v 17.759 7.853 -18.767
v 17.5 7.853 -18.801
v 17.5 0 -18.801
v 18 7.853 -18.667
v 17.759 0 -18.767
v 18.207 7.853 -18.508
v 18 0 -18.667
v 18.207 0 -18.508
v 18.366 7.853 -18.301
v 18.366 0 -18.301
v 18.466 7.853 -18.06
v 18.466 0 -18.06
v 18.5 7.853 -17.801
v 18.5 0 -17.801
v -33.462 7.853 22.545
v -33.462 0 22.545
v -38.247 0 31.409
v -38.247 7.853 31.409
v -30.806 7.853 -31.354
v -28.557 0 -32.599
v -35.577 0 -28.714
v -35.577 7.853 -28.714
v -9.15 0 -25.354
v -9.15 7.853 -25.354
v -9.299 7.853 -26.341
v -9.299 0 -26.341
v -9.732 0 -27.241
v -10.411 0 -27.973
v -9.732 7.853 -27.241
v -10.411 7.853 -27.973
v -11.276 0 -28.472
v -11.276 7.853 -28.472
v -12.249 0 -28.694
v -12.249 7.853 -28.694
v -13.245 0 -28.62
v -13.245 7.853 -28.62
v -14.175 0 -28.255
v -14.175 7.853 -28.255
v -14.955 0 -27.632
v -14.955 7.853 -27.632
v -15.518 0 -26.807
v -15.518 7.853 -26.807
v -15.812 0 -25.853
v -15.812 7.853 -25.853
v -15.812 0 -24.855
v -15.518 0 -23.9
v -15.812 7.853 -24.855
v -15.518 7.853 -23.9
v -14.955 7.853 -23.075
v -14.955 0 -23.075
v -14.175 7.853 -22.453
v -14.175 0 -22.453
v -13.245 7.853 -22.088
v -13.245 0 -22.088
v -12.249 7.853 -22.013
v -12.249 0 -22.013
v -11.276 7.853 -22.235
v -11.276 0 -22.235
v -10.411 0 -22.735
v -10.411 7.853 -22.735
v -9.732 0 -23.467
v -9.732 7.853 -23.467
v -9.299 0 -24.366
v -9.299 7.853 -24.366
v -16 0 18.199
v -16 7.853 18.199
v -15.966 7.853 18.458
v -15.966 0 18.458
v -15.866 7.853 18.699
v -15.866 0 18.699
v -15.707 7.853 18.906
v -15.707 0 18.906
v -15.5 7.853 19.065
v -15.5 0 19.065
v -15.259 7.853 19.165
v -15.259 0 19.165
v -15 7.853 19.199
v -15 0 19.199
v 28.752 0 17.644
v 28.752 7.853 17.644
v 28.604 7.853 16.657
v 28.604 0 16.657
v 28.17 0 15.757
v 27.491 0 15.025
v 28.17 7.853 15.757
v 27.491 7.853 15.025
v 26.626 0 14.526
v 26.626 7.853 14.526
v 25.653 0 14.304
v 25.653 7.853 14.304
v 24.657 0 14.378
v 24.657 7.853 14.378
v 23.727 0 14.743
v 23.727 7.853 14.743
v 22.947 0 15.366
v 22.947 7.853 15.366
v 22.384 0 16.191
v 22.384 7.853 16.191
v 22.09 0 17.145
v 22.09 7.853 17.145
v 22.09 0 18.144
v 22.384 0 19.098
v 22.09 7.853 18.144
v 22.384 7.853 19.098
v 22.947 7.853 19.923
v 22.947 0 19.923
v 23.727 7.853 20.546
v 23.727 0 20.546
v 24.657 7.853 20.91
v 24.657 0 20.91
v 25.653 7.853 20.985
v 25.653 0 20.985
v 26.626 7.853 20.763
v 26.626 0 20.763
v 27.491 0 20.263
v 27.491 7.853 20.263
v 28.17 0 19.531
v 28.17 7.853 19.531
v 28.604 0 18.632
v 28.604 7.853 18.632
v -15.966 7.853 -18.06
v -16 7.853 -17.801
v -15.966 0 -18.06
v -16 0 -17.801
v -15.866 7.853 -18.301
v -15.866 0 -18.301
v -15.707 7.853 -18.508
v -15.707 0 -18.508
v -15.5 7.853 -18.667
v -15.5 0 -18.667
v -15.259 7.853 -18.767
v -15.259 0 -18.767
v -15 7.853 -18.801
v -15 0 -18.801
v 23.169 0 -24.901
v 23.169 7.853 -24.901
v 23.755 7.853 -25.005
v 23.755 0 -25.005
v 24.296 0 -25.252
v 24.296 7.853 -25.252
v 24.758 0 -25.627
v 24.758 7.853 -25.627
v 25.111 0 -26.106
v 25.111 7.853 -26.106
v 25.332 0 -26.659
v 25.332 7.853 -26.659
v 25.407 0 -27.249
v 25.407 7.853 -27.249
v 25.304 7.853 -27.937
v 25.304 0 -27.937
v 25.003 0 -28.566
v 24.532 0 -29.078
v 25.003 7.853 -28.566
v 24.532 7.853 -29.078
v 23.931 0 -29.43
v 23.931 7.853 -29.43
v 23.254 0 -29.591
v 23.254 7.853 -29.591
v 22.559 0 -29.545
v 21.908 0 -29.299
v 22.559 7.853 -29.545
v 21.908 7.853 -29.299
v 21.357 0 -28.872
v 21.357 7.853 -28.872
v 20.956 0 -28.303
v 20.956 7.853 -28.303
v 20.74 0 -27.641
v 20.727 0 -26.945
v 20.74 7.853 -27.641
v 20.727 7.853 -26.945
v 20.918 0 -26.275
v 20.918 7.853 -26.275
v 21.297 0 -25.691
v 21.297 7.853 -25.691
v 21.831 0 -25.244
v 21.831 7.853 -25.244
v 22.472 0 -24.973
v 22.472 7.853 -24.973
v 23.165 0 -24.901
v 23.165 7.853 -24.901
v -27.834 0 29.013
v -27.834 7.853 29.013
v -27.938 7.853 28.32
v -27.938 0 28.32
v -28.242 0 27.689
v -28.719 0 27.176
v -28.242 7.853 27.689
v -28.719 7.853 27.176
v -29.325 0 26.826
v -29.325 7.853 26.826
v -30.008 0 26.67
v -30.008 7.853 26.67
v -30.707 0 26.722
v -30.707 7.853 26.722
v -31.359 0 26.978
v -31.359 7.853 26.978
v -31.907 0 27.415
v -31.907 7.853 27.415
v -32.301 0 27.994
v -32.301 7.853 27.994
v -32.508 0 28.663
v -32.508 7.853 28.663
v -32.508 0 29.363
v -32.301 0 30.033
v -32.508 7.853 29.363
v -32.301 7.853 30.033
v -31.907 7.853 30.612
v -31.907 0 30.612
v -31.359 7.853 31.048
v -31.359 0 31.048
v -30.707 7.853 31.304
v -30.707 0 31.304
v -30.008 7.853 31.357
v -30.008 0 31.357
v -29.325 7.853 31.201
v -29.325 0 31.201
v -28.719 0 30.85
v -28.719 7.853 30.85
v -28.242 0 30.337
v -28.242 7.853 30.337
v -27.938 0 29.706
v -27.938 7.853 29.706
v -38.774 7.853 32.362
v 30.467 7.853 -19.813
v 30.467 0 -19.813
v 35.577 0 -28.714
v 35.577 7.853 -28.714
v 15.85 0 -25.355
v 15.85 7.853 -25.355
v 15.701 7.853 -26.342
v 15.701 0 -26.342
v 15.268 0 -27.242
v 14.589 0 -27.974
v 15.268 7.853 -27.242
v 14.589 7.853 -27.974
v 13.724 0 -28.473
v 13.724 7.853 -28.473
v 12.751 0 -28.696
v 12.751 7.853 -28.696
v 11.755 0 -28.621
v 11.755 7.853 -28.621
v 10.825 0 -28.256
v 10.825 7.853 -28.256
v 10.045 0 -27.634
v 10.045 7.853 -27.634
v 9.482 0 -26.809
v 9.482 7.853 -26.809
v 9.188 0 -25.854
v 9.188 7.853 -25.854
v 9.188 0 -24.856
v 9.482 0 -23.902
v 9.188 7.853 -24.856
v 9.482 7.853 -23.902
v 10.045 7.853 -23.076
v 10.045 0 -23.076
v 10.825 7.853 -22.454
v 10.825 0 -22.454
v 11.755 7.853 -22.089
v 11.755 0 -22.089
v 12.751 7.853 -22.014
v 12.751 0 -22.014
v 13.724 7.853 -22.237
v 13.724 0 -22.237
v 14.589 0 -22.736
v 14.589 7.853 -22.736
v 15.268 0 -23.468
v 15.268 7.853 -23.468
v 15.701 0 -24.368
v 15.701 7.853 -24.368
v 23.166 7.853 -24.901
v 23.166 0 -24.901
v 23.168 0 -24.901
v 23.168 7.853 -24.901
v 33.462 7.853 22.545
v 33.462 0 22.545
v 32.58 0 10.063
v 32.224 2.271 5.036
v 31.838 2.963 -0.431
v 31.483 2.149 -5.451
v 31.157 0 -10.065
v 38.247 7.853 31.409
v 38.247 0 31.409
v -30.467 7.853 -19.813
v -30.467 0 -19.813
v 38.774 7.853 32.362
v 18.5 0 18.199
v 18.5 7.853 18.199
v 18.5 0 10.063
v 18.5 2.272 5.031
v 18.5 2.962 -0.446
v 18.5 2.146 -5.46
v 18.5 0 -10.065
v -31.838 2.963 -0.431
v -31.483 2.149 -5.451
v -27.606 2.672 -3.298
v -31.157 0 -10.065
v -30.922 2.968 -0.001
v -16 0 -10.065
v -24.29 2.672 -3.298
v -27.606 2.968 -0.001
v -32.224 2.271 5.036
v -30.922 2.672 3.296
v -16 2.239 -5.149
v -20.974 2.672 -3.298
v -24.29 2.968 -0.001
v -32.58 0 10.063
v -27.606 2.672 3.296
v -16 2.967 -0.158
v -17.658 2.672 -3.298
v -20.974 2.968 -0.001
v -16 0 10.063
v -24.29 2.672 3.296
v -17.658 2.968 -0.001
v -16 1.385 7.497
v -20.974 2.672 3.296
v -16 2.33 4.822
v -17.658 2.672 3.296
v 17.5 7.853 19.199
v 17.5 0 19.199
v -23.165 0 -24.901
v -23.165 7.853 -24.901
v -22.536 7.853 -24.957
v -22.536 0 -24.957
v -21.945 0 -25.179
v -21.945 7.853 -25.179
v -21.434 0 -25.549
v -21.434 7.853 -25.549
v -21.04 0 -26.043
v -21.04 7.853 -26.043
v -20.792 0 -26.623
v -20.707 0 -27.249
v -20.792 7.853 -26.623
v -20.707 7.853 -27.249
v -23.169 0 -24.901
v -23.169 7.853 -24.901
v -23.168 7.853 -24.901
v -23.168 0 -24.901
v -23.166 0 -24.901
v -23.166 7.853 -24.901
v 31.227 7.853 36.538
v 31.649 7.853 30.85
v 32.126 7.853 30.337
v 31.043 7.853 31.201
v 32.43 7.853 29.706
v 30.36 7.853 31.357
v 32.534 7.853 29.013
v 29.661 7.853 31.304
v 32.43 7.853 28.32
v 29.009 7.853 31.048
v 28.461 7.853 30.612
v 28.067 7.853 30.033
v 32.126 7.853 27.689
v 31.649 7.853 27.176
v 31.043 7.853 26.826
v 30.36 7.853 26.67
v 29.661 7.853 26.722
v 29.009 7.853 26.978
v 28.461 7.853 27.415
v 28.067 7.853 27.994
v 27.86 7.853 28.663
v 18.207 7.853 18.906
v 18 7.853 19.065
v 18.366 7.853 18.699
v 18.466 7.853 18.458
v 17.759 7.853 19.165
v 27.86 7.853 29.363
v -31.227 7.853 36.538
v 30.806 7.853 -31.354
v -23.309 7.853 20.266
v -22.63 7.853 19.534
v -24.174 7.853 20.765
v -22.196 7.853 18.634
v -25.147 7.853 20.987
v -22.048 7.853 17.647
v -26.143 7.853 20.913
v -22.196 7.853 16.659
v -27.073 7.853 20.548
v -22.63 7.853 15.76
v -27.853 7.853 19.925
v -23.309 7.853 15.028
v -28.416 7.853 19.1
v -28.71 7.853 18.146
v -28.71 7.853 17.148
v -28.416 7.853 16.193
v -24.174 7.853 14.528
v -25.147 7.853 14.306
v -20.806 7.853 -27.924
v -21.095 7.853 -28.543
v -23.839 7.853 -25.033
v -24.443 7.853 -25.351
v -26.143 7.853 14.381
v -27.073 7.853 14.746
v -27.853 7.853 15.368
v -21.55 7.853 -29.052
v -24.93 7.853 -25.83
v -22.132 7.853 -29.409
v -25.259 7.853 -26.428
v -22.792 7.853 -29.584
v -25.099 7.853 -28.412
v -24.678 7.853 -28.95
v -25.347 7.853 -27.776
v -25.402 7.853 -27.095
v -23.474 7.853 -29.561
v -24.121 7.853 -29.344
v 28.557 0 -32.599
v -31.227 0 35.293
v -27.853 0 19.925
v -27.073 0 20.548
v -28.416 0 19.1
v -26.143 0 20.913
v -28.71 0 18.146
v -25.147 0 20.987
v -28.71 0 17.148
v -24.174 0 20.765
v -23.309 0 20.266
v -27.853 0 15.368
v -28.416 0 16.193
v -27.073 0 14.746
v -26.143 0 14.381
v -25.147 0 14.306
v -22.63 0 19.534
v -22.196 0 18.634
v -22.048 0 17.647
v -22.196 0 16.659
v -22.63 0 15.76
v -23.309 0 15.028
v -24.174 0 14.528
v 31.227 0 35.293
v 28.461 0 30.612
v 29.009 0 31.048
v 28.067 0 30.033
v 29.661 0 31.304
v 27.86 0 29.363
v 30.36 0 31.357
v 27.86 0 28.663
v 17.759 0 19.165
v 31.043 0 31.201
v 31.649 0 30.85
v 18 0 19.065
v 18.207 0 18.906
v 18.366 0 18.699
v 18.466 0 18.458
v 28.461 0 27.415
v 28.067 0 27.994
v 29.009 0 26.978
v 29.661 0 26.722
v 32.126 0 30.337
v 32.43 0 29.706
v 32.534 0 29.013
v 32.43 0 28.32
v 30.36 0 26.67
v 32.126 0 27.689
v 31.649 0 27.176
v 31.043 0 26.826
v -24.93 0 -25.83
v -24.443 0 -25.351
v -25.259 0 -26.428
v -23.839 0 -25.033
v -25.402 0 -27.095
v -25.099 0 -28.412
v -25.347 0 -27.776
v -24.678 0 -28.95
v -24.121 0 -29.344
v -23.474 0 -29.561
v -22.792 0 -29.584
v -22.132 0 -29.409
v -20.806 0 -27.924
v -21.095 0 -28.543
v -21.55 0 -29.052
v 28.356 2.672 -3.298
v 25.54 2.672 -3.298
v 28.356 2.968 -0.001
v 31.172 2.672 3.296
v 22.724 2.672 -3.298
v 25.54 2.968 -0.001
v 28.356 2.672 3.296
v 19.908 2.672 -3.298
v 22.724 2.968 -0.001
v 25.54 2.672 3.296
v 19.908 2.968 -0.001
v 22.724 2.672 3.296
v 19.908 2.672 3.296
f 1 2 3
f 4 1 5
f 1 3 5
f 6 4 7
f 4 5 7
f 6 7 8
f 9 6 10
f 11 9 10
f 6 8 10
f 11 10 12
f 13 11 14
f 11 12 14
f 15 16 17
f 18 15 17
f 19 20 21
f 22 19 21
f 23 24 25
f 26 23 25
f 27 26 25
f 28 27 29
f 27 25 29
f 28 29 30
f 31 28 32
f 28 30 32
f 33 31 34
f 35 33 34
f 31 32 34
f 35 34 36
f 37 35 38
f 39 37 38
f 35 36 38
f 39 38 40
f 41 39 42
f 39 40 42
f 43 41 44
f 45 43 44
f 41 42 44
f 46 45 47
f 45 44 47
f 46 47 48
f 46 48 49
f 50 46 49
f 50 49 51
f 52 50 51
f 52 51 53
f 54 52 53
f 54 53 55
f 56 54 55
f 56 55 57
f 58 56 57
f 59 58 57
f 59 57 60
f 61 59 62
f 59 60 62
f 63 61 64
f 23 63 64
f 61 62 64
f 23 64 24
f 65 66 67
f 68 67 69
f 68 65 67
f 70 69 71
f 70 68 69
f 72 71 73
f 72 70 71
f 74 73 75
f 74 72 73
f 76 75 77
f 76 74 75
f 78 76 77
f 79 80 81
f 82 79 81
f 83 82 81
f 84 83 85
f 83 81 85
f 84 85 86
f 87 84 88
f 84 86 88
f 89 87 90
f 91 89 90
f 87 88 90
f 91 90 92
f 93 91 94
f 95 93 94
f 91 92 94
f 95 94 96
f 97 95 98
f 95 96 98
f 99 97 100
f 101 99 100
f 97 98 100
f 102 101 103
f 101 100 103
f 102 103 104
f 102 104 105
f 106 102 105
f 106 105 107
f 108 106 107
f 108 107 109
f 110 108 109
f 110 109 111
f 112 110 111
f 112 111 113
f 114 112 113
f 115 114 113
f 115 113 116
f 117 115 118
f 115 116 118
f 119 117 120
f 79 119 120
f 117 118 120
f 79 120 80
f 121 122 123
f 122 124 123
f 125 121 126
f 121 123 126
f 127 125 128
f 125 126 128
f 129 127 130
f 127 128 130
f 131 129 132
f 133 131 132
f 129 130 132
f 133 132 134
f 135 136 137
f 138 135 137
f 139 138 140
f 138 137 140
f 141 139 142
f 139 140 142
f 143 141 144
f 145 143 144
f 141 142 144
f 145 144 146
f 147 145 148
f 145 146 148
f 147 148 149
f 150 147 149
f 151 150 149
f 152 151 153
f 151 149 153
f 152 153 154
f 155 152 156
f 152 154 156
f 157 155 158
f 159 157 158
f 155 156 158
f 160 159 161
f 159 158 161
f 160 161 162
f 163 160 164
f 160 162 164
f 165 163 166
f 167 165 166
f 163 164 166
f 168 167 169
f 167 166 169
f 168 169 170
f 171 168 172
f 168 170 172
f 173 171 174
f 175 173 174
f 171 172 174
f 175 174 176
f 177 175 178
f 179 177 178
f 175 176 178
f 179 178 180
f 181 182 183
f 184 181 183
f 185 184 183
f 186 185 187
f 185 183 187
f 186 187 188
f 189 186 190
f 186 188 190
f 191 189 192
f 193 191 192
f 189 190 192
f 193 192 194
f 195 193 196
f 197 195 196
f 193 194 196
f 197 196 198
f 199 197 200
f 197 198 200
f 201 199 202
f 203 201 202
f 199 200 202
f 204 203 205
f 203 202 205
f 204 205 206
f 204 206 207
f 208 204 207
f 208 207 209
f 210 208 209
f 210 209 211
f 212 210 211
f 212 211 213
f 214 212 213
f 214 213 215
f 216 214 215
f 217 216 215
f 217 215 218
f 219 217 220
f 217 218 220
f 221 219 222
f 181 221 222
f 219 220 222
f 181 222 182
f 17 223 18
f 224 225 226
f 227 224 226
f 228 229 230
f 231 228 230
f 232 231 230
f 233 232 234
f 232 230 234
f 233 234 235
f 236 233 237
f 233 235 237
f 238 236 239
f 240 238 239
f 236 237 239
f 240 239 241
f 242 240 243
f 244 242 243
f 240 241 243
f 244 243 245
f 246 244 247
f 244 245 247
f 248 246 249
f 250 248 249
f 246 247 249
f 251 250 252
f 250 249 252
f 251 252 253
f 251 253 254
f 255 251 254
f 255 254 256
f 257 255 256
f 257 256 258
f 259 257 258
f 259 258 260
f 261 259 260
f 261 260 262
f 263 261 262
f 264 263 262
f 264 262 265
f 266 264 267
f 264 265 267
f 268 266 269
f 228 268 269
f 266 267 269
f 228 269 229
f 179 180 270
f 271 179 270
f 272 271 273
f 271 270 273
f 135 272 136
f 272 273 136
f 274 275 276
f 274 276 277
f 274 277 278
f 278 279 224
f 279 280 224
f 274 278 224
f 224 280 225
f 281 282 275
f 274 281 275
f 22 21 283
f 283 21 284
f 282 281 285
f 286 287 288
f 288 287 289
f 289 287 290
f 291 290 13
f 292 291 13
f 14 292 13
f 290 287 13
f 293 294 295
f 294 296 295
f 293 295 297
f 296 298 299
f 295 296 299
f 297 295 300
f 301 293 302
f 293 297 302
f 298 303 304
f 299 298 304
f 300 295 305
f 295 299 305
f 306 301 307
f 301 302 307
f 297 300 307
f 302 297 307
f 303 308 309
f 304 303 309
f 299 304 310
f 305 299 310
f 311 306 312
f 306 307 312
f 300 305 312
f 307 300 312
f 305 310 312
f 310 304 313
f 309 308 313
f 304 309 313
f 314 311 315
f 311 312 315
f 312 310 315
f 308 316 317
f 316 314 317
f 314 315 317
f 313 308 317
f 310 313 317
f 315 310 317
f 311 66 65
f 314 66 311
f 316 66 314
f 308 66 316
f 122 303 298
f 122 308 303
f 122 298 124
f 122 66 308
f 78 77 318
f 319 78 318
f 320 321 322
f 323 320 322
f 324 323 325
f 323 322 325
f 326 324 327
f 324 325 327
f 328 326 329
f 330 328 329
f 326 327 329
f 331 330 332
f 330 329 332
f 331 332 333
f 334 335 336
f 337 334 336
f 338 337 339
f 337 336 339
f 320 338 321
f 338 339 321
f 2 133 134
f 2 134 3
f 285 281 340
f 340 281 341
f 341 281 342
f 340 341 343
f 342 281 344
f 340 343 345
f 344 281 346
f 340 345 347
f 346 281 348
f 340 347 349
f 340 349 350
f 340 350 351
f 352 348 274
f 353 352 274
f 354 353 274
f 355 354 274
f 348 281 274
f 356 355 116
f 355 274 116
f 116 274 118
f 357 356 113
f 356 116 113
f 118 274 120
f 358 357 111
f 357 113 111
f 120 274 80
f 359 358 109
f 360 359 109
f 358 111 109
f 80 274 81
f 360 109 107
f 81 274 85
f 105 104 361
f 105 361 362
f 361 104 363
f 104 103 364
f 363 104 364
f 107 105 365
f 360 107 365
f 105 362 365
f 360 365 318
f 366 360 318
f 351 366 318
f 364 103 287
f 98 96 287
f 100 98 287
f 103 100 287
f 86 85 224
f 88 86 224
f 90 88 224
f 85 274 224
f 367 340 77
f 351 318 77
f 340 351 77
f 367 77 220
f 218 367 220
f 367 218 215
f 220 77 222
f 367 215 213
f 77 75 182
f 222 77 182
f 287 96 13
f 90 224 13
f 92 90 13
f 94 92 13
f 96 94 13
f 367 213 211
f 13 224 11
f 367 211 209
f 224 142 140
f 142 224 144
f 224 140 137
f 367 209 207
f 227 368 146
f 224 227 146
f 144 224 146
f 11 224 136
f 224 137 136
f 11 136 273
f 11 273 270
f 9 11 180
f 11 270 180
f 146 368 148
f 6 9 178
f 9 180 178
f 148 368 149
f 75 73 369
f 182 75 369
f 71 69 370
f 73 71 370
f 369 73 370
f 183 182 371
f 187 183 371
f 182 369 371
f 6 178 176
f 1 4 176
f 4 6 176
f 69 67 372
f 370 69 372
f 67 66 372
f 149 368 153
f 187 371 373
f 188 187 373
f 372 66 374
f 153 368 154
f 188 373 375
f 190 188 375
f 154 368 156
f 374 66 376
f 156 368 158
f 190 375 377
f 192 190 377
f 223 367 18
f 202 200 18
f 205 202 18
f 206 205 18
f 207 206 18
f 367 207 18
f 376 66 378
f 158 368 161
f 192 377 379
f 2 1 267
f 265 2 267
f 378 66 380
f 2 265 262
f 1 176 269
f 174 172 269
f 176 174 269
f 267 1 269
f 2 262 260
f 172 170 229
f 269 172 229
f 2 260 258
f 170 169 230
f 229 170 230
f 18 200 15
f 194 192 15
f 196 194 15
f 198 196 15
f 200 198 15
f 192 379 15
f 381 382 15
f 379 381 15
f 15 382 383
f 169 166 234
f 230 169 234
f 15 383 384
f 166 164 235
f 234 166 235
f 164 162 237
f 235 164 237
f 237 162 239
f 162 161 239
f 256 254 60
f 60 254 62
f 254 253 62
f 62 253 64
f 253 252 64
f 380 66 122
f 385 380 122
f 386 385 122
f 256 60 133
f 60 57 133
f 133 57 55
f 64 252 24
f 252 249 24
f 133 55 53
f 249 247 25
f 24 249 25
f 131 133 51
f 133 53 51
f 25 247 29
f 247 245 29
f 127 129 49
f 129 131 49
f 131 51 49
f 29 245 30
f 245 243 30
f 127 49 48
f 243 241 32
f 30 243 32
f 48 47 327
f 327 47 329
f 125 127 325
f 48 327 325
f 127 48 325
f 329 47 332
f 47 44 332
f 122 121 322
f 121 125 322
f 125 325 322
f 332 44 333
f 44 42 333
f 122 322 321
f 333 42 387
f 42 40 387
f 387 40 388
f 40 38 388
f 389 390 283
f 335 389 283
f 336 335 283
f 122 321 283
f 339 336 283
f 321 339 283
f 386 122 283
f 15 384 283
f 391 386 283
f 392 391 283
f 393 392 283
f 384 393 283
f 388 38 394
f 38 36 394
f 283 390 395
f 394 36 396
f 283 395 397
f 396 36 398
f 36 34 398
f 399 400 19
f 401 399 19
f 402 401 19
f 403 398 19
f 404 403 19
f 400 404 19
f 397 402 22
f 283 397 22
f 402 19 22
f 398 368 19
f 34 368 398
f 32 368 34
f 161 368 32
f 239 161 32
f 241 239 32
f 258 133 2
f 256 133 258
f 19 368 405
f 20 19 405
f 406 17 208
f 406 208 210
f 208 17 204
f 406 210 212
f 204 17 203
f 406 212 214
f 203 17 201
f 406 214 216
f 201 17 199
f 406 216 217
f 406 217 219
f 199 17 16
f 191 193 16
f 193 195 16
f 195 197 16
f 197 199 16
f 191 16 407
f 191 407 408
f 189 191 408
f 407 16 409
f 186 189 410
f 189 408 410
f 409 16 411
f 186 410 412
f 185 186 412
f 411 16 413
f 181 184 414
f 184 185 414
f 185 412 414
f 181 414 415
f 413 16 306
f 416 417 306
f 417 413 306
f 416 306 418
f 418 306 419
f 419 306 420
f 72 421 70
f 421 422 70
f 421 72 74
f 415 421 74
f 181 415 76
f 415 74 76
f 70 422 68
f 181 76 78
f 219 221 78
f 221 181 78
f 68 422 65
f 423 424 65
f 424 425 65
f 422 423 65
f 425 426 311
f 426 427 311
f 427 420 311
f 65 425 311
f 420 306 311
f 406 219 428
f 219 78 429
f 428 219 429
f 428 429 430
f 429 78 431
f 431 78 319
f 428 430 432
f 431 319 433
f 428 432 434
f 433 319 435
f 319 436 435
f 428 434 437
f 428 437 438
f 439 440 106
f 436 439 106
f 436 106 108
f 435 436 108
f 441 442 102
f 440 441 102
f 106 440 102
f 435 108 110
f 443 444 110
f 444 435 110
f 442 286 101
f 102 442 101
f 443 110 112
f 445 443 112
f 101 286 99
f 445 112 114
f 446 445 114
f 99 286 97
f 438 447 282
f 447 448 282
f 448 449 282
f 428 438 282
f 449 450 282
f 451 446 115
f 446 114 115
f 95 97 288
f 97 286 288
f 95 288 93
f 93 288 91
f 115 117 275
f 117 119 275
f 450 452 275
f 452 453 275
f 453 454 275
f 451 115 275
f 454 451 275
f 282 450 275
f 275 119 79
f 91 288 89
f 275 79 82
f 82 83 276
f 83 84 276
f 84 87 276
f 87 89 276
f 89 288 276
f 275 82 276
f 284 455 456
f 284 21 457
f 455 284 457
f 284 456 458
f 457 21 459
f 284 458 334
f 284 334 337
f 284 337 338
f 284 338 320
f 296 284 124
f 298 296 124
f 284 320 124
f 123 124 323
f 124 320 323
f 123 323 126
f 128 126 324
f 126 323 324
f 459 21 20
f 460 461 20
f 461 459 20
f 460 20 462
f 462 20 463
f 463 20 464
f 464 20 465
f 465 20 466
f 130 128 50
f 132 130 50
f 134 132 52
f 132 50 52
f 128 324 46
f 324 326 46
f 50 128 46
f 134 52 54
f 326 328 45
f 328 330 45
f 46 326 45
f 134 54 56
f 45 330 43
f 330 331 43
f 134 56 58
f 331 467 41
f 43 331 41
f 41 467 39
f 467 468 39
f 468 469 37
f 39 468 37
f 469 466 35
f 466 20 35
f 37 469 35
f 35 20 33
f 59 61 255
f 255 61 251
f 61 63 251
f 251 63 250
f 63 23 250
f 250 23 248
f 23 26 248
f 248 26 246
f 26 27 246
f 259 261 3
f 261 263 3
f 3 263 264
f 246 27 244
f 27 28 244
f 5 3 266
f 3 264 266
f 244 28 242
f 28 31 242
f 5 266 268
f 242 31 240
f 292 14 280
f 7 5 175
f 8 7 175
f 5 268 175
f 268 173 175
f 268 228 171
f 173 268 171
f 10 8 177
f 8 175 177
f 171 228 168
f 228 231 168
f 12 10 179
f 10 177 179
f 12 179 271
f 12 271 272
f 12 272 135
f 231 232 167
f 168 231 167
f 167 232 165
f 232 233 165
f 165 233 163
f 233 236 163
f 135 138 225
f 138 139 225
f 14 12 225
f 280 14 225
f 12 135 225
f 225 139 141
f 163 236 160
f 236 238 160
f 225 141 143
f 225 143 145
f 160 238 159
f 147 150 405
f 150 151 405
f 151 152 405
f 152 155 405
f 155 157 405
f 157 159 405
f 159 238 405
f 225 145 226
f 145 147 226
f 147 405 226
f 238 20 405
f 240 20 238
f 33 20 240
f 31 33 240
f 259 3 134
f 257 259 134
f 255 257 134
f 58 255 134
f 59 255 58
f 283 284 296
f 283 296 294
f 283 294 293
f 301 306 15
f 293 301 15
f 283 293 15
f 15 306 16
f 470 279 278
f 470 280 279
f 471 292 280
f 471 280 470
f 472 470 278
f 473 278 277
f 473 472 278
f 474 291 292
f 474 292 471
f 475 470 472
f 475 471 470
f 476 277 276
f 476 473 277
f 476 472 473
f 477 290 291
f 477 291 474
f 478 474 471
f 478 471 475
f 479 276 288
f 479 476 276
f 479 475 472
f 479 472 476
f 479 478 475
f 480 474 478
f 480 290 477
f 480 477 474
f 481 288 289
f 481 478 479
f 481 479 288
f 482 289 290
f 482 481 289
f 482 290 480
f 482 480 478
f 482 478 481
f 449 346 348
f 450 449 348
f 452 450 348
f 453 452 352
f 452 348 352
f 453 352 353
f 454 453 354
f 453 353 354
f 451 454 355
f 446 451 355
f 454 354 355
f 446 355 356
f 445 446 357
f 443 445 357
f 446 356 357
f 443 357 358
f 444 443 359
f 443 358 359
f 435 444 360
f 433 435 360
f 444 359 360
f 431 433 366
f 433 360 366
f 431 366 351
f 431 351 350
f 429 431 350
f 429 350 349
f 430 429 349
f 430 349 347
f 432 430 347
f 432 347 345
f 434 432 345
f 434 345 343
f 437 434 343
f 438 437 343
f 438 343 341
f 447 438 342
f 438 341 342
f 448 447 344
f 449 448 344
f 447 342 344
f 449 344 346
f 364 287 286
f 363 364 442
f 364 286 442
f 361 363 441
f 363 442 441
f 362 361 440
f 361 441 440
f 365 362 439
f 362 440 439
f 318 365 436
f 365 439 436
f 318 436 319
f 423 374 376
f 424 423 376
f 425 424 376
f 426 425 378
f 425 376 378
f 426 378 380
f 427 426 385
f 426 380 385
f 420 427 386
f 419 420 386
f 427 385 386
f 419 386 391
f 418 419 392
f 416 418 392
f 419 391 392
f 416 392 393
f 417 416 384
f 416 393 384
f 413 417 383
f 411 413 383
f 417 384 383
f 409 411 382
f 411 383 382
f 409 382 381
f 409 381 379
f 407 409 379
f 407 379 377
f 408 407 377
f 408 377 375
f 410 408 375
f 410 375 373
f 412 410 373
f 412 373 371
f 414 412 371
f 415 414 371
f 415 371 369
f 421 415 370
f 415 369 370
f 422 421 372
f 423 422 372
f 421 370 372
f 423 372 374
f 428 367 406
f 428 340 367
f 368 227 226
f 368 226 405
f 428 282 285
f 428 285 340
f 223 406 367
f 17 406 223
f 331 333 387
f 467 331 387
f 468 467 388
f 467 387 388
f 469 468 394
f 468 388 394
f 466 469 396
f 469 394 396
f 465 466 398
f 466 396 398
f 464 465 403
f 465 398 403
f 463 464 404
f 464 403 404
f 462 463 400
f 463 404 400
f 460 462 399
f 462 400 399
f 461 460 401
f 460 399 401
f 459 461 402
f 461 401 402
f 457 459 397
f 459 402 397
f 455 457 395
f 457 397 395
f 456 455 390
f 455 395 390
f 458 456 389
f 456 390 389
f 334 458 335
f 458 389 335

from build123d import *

# Parameters (mm, degrees)
BOSS_EXTRUDE1_DEPTH      = 10
CUT_EXTRUDE1_DEPTH       = 39.246851426
CUT_EXTRUDE1_DEPTH_BACK  = 39.246851426
BOSS_EXTRUDE2_DEPTH      = 31.226887
BOSS_EXTRUDE2_DEPTH_BACK = 31.226887
BOSS_EXTRUDE4_DEPTH      = 7.852901
CUT_EXTRUDE6_REACH       = 15.474
BOSS_EXTRUDE6_DEPTH      = 7.852901
CUT_EXTRUDE7_REACH       = 15.474
SKETCH15_W               = 34.5
SKETCH15_H               = 38
CUT_EXTRUDE8_DEPTH       = 8.852900758
FILLET1_R                = 1
SKETCH16_R               = 2.35
CUT_EXTRUDE9_DEPTH       = 7.852901
SKETCH18_R               = 3.35
CUT_EXTRUDE10_DEPTH      = 7.852901
CUT_EXTRUDE11_DEPTH      = 55.774002508
CUT_EXTRUDE11_DEPTH_BACK = 23.774002507


with BuildPart() as part:
    # Sketch1 → Boss-Extrude1 (new body)
    with BuildSketch(Plane(origin=(0, 0, 0), x_dir=(1, 0, 0), z_dir=(0, 1, 0))):
        Polygon((28.55688655, 32.59875814), (-28.55688655, 32.59875814), (-35.576851431, 28.714212738), (-30.467341853, 19.813019987), (-33.461967186, -22.544744449), (-38.246851426, -31.408872502), (-31.226886544, -35.293417903), (31.226886544, -35.293417903), (38.246851426, -31.408872502), (33.461967186, -22.544744449), (30.467341853, 19.813019987), (35.576851431, 28.714212738), align=None)
    extrude(amount=BOSS_EXTRUDE1_DEPTH)

    # Sketch3 → Cut-Extrude1 (cut, two sides)
    with BuildSketch(Plane(origin=(0, 0, 0), x_dir=(0, 0, -1), z_dir=(1, 0, 0))) as cut_extrude1_sk:
        Polygon((31.354413252, 7.852900712), (32.59875814, 0), (34.072271083, 0), (34.072271083, 12.681172501), (31.434287212, 12.681172501), (-35.293417903, 12.681172501), (-35.293417903, 10), (-35.293417903, 7.852900712), align=None)
    extrude(amount=CUT_EXTRUDE1_DEPTH, mode=Mode.SUBTRACT)
    extrude(cut_extrude1_sk.sketch, amount=-CUT_EXTRUDE1_DEPTH_BACK, mode=Mode.SUBTRACT)

    # Sketch5 → Boss-Extrude2 (add, two sides)
    with BuildSketch(Plane(origin=(0, 0, 0), x_dir=(0, 0, -1), z_dir=(1, 0, 0))) as boss_extrude2_sk:
        Polygon((-35.29341791, 0), (-35.293417904, 7.852900712), (-36.537762798, 7.852900712), align=None)
    extrude(amount=BOSS_EXTRUDE2_DEPTH)
    extrude(boss_extrude2_sk.sketch, amount=-BOSS_EXTRUDE2_DEPTH_BACK)

    # Sketch7 → Boss-Extrude4 (add)
    with BuildSketch(Plane(origin=(0, 7.852900712, 0), x_dir=(1, 0, 0), z_dir=(0, 1, 0))):
        Polygon((31.226886544, -35.293417903), (38.246851426, -31.408872502), (38.774002508, -32.361514754), (31.226886544, -36.537762798), align=None)
    extrude(amount=-BOSS_EXTRUDE4_DEPTH)

    # Cut-Extrude6: up to this face of the body (flat: up to its plane)
    cut_extrude6_end = Plane(part.part.faces().sort_by_distance((0.070807589, 7.852900712, 3.202963046))[0])
    # Sketch12 → Cut-Extrude6 (cut, up to the picked face)
    with BuildSketch(Plane(origin=(0, 0, 0), x_dir=(1, 0, 0), z_dir=(0, 0.987677308, 0.156504106)), mode=Mode.PRIVATE) as cut_extrude6_sk1:
        Polygon((30.896216351, -36.268243015), (31.226886544, -36.087519199), (38.774002508, -31.962733774), (39.457900831, -31.588957374), (38.940691815, -30.642620529), (31.226886544, -34.85850799), (30.896216351, -34.85850799), align=None)
    cut_extrude6_tool1 = split(extrude(cut_extrude6_sk1.sketch, amount=CUT_EXTRUDE6_REACH, mode=Mode.PRIVATE), bisect_by=cut_extrude6_end, keep=Keep.BOTH, mode=Mode.PRIVATE)
    add(cut_extrude6_tool1.solids().sort_by_distance((35.037296, -5.226434, 32.983357))[0], mode=Mode.SUBTRACT)

    # Sketch13 → Boss-Extrude6 (add)
    with BuildSketch(Plane(origin=(0, 7.852900712, 0), x_dir=(1, 0, 0), z_dir=(0, 1, 0))):
        Polygon((-31.226886544, -35.293417904), (-31.226886544, -36.537762798), (-38.774002507, -32.361514753), (-38.246851426, -31.408872502), align=None)
    extrude(amount=-BOSS_EXTRUDE6_DEPTH)

    # Cut-Extrude7: up to this face of the body (flat: up to its plane)
    cut_extrude7_end = Plane(part.part.faces().sort_by_distance((0, 7.852900712, 3.265184411))[0])
    # Sketch14 → Cut-Extrude7 (cut, up to the picked face)
    with BuildSketch(Plane(origin=(0, 0, 0), x_dir=(1, 0, 0), z_dir=(0, 0.987677308, 0.156504106)), mode=Mode.PRIVATE) as cut_extrude7_sk1:
        Polygon((-38.774002507, -31.962733773), (-31.226886544, -36.087519199), (-31.226886544, -34.858507985), (-39.138580492, -30.534466847), (-40.986059535, -30.753760618), align=None)
    cut_extrude7_tool1 = split(extrude(cut_extrude7_sk1.sketch, amount=CUT_EXTRUDE7_REACH, mode=Mode.PRIVATE), bisect_by=cut_extrude7_end, keep=Keep.BOTH, mode=Mode.PRIVATE)
    add(cut_extrude7_tool1.solids().sort_by_distance((-35.660699, -5.175776, 32.663656))[0], mode=Mode.SUBTRACT)

    # Sketch15 → Cut-Extrude8 (cut, through all)
    with BuildSketch(Plane(origin=(0, 7.852900712, 0), x_dir=(1, 0, 0), z_dir=(0, 1, 0))):
        with Locations((1.25, -0.19872767)):
            Rectangle(SKETCH15_W, SKETCH15_H)
    extrude(amount=-CUT_EXTRUDE8_DEPTH, mode=Mode.SUBTRACT)

    # Fillet1
    fillet1_edges = [part.edges().sort_by_distance(p)[0] for p in [
        (-16, 3.926450356, 19.19872767),
        (-16, 3.926450356, -18.80127233),
        (18.5, 3.926450356, -18.80127233),
        (18.5, 3.926450356, 19.19872767),
    ]]
    fillet(fillet1_edges, radius=FILLET1_R)

    # Sketch16 → Cut-Extrude9 (cut)
    with BuildSketch(Plane(origin=(0, 7.852900712, 0), x_dir=(1, 0, 0), z_dir=(0, 1, 0))):
        with BuildLine():
            ThreePointArc((-23.169283502, 24.901447562), (-23.167136672, 24.901345749), (-23.16498975, 24.901245899))
            ThreePointArc((-23.16498975, 24.901245899), (-21.433855825, 25.549266666), (-20.706886553, 27.248758135))
            ThreePointArc((-20.706886553, 27.248758135), (-24.678362296, 28.949733272), (-23.169283502, 24.901447563))
        make_face()
        with Locations((-30.183959547, -29.01317237)):
            Circle(SKETCH16_R)
        with Locations((30.183959554, -29.013172365)):
            Circle(SKETCH16_R)
        with BuildLine():
            ThreePointArc((23.164989747, 24.901245903), (23.167136669, 24.901345753), (23.169283499, 24.901447567))
            ThreePointArc((23.169283499, 24.901447567), (24.757861687, 25.627282396), (25.40688655, 27.24875814))
            ThreePointArc((25.40688655, 27.24875814), (21.357395081, 28.871788867), (23.164989747, 24.901245903))
        make_face()
    extrude(amount=-CUT_EXTRUDE9_DEPTH, mode=Mode.SUBTRACT)

    # Sketch18 → Cut-Extrude10 (cut)
    with BuildSketch(Plane(origin=(0, 7.852900712, 0), x_dir=(1, 0, 0), z_dir=(0, 1, 0))):
        with Locations((-25.397590164, -17.646835853)):
            Circle(SKETCH18_R)
        with Locations((12.500295063, 25.355028006)):
            Circle(SKETCH18_R)
        with Locations((-12.499704907, 25.353798513)):
            Circle(SKETCH18_R)
        with Locations((25.402409775, -17.644337524)):
            Circle(SKETCH18_R)
    extrude(amount=-CUT_EXTRUDE10_DEPTH, mode=Mode.SUBTRACT)

    # Sketch19 → Cut-Extrude11 (cut, two sides)
    with BuildSketch(Plane(origin=(-16, 0, 0), x_dir=(0, 0, -1), z_dir=(1, 0, 0))) as cut_extrude11_sk:
        with BuildLine():
            Line((-10.0632786, 0), (10.065144671, 0))
            add(Edge.make_bspline(
                [(0.000933035, 2.967511147), (0.544521725, 2.967511147), (1.619583471, 2.921196479), (3.854022546, 2.625629399), (6.684377205, 1.845878396), (8.927393688, 0.727415261), (10.014615597, 0.032640048), (10.065144671, 0)],
                knots=[0, 0, 0, 0, 0.0625, 0.125, 0.25, 0.375, 0.381109812, 0.381109812, 0.381109812, 0.381109812], degree=3))
            add(Edge.make_bspline(
                [(0.000933035, 2.967511147), (-0.542655654, 2.967511147), (-1.6177174, 2.921196479), (-3.852156475, 2.625629399), (-6.682511135, 1.845878396), (-8.925527618, 0.727415261), (-10.012749527, 0.032640048), (-10.0632786, 0)],
                knots=[0, 0, 0, 0, 0.0625, 0.125, 0.25, 0.375, 0.381109812, 0.381109812, 0.381109812, 0.381109812], degree=3))
        make_face()
    extrude(amount=CUT_EXTRUDE11_DEPTH, mode=Mode.SUBTRACT)
    extrude(cut_extrude11_sk.sketch, amount=-CUT_EXTRUDE11_DEPTH_BACK, mode=Mode.SUBTRACT)


solid = part.part
